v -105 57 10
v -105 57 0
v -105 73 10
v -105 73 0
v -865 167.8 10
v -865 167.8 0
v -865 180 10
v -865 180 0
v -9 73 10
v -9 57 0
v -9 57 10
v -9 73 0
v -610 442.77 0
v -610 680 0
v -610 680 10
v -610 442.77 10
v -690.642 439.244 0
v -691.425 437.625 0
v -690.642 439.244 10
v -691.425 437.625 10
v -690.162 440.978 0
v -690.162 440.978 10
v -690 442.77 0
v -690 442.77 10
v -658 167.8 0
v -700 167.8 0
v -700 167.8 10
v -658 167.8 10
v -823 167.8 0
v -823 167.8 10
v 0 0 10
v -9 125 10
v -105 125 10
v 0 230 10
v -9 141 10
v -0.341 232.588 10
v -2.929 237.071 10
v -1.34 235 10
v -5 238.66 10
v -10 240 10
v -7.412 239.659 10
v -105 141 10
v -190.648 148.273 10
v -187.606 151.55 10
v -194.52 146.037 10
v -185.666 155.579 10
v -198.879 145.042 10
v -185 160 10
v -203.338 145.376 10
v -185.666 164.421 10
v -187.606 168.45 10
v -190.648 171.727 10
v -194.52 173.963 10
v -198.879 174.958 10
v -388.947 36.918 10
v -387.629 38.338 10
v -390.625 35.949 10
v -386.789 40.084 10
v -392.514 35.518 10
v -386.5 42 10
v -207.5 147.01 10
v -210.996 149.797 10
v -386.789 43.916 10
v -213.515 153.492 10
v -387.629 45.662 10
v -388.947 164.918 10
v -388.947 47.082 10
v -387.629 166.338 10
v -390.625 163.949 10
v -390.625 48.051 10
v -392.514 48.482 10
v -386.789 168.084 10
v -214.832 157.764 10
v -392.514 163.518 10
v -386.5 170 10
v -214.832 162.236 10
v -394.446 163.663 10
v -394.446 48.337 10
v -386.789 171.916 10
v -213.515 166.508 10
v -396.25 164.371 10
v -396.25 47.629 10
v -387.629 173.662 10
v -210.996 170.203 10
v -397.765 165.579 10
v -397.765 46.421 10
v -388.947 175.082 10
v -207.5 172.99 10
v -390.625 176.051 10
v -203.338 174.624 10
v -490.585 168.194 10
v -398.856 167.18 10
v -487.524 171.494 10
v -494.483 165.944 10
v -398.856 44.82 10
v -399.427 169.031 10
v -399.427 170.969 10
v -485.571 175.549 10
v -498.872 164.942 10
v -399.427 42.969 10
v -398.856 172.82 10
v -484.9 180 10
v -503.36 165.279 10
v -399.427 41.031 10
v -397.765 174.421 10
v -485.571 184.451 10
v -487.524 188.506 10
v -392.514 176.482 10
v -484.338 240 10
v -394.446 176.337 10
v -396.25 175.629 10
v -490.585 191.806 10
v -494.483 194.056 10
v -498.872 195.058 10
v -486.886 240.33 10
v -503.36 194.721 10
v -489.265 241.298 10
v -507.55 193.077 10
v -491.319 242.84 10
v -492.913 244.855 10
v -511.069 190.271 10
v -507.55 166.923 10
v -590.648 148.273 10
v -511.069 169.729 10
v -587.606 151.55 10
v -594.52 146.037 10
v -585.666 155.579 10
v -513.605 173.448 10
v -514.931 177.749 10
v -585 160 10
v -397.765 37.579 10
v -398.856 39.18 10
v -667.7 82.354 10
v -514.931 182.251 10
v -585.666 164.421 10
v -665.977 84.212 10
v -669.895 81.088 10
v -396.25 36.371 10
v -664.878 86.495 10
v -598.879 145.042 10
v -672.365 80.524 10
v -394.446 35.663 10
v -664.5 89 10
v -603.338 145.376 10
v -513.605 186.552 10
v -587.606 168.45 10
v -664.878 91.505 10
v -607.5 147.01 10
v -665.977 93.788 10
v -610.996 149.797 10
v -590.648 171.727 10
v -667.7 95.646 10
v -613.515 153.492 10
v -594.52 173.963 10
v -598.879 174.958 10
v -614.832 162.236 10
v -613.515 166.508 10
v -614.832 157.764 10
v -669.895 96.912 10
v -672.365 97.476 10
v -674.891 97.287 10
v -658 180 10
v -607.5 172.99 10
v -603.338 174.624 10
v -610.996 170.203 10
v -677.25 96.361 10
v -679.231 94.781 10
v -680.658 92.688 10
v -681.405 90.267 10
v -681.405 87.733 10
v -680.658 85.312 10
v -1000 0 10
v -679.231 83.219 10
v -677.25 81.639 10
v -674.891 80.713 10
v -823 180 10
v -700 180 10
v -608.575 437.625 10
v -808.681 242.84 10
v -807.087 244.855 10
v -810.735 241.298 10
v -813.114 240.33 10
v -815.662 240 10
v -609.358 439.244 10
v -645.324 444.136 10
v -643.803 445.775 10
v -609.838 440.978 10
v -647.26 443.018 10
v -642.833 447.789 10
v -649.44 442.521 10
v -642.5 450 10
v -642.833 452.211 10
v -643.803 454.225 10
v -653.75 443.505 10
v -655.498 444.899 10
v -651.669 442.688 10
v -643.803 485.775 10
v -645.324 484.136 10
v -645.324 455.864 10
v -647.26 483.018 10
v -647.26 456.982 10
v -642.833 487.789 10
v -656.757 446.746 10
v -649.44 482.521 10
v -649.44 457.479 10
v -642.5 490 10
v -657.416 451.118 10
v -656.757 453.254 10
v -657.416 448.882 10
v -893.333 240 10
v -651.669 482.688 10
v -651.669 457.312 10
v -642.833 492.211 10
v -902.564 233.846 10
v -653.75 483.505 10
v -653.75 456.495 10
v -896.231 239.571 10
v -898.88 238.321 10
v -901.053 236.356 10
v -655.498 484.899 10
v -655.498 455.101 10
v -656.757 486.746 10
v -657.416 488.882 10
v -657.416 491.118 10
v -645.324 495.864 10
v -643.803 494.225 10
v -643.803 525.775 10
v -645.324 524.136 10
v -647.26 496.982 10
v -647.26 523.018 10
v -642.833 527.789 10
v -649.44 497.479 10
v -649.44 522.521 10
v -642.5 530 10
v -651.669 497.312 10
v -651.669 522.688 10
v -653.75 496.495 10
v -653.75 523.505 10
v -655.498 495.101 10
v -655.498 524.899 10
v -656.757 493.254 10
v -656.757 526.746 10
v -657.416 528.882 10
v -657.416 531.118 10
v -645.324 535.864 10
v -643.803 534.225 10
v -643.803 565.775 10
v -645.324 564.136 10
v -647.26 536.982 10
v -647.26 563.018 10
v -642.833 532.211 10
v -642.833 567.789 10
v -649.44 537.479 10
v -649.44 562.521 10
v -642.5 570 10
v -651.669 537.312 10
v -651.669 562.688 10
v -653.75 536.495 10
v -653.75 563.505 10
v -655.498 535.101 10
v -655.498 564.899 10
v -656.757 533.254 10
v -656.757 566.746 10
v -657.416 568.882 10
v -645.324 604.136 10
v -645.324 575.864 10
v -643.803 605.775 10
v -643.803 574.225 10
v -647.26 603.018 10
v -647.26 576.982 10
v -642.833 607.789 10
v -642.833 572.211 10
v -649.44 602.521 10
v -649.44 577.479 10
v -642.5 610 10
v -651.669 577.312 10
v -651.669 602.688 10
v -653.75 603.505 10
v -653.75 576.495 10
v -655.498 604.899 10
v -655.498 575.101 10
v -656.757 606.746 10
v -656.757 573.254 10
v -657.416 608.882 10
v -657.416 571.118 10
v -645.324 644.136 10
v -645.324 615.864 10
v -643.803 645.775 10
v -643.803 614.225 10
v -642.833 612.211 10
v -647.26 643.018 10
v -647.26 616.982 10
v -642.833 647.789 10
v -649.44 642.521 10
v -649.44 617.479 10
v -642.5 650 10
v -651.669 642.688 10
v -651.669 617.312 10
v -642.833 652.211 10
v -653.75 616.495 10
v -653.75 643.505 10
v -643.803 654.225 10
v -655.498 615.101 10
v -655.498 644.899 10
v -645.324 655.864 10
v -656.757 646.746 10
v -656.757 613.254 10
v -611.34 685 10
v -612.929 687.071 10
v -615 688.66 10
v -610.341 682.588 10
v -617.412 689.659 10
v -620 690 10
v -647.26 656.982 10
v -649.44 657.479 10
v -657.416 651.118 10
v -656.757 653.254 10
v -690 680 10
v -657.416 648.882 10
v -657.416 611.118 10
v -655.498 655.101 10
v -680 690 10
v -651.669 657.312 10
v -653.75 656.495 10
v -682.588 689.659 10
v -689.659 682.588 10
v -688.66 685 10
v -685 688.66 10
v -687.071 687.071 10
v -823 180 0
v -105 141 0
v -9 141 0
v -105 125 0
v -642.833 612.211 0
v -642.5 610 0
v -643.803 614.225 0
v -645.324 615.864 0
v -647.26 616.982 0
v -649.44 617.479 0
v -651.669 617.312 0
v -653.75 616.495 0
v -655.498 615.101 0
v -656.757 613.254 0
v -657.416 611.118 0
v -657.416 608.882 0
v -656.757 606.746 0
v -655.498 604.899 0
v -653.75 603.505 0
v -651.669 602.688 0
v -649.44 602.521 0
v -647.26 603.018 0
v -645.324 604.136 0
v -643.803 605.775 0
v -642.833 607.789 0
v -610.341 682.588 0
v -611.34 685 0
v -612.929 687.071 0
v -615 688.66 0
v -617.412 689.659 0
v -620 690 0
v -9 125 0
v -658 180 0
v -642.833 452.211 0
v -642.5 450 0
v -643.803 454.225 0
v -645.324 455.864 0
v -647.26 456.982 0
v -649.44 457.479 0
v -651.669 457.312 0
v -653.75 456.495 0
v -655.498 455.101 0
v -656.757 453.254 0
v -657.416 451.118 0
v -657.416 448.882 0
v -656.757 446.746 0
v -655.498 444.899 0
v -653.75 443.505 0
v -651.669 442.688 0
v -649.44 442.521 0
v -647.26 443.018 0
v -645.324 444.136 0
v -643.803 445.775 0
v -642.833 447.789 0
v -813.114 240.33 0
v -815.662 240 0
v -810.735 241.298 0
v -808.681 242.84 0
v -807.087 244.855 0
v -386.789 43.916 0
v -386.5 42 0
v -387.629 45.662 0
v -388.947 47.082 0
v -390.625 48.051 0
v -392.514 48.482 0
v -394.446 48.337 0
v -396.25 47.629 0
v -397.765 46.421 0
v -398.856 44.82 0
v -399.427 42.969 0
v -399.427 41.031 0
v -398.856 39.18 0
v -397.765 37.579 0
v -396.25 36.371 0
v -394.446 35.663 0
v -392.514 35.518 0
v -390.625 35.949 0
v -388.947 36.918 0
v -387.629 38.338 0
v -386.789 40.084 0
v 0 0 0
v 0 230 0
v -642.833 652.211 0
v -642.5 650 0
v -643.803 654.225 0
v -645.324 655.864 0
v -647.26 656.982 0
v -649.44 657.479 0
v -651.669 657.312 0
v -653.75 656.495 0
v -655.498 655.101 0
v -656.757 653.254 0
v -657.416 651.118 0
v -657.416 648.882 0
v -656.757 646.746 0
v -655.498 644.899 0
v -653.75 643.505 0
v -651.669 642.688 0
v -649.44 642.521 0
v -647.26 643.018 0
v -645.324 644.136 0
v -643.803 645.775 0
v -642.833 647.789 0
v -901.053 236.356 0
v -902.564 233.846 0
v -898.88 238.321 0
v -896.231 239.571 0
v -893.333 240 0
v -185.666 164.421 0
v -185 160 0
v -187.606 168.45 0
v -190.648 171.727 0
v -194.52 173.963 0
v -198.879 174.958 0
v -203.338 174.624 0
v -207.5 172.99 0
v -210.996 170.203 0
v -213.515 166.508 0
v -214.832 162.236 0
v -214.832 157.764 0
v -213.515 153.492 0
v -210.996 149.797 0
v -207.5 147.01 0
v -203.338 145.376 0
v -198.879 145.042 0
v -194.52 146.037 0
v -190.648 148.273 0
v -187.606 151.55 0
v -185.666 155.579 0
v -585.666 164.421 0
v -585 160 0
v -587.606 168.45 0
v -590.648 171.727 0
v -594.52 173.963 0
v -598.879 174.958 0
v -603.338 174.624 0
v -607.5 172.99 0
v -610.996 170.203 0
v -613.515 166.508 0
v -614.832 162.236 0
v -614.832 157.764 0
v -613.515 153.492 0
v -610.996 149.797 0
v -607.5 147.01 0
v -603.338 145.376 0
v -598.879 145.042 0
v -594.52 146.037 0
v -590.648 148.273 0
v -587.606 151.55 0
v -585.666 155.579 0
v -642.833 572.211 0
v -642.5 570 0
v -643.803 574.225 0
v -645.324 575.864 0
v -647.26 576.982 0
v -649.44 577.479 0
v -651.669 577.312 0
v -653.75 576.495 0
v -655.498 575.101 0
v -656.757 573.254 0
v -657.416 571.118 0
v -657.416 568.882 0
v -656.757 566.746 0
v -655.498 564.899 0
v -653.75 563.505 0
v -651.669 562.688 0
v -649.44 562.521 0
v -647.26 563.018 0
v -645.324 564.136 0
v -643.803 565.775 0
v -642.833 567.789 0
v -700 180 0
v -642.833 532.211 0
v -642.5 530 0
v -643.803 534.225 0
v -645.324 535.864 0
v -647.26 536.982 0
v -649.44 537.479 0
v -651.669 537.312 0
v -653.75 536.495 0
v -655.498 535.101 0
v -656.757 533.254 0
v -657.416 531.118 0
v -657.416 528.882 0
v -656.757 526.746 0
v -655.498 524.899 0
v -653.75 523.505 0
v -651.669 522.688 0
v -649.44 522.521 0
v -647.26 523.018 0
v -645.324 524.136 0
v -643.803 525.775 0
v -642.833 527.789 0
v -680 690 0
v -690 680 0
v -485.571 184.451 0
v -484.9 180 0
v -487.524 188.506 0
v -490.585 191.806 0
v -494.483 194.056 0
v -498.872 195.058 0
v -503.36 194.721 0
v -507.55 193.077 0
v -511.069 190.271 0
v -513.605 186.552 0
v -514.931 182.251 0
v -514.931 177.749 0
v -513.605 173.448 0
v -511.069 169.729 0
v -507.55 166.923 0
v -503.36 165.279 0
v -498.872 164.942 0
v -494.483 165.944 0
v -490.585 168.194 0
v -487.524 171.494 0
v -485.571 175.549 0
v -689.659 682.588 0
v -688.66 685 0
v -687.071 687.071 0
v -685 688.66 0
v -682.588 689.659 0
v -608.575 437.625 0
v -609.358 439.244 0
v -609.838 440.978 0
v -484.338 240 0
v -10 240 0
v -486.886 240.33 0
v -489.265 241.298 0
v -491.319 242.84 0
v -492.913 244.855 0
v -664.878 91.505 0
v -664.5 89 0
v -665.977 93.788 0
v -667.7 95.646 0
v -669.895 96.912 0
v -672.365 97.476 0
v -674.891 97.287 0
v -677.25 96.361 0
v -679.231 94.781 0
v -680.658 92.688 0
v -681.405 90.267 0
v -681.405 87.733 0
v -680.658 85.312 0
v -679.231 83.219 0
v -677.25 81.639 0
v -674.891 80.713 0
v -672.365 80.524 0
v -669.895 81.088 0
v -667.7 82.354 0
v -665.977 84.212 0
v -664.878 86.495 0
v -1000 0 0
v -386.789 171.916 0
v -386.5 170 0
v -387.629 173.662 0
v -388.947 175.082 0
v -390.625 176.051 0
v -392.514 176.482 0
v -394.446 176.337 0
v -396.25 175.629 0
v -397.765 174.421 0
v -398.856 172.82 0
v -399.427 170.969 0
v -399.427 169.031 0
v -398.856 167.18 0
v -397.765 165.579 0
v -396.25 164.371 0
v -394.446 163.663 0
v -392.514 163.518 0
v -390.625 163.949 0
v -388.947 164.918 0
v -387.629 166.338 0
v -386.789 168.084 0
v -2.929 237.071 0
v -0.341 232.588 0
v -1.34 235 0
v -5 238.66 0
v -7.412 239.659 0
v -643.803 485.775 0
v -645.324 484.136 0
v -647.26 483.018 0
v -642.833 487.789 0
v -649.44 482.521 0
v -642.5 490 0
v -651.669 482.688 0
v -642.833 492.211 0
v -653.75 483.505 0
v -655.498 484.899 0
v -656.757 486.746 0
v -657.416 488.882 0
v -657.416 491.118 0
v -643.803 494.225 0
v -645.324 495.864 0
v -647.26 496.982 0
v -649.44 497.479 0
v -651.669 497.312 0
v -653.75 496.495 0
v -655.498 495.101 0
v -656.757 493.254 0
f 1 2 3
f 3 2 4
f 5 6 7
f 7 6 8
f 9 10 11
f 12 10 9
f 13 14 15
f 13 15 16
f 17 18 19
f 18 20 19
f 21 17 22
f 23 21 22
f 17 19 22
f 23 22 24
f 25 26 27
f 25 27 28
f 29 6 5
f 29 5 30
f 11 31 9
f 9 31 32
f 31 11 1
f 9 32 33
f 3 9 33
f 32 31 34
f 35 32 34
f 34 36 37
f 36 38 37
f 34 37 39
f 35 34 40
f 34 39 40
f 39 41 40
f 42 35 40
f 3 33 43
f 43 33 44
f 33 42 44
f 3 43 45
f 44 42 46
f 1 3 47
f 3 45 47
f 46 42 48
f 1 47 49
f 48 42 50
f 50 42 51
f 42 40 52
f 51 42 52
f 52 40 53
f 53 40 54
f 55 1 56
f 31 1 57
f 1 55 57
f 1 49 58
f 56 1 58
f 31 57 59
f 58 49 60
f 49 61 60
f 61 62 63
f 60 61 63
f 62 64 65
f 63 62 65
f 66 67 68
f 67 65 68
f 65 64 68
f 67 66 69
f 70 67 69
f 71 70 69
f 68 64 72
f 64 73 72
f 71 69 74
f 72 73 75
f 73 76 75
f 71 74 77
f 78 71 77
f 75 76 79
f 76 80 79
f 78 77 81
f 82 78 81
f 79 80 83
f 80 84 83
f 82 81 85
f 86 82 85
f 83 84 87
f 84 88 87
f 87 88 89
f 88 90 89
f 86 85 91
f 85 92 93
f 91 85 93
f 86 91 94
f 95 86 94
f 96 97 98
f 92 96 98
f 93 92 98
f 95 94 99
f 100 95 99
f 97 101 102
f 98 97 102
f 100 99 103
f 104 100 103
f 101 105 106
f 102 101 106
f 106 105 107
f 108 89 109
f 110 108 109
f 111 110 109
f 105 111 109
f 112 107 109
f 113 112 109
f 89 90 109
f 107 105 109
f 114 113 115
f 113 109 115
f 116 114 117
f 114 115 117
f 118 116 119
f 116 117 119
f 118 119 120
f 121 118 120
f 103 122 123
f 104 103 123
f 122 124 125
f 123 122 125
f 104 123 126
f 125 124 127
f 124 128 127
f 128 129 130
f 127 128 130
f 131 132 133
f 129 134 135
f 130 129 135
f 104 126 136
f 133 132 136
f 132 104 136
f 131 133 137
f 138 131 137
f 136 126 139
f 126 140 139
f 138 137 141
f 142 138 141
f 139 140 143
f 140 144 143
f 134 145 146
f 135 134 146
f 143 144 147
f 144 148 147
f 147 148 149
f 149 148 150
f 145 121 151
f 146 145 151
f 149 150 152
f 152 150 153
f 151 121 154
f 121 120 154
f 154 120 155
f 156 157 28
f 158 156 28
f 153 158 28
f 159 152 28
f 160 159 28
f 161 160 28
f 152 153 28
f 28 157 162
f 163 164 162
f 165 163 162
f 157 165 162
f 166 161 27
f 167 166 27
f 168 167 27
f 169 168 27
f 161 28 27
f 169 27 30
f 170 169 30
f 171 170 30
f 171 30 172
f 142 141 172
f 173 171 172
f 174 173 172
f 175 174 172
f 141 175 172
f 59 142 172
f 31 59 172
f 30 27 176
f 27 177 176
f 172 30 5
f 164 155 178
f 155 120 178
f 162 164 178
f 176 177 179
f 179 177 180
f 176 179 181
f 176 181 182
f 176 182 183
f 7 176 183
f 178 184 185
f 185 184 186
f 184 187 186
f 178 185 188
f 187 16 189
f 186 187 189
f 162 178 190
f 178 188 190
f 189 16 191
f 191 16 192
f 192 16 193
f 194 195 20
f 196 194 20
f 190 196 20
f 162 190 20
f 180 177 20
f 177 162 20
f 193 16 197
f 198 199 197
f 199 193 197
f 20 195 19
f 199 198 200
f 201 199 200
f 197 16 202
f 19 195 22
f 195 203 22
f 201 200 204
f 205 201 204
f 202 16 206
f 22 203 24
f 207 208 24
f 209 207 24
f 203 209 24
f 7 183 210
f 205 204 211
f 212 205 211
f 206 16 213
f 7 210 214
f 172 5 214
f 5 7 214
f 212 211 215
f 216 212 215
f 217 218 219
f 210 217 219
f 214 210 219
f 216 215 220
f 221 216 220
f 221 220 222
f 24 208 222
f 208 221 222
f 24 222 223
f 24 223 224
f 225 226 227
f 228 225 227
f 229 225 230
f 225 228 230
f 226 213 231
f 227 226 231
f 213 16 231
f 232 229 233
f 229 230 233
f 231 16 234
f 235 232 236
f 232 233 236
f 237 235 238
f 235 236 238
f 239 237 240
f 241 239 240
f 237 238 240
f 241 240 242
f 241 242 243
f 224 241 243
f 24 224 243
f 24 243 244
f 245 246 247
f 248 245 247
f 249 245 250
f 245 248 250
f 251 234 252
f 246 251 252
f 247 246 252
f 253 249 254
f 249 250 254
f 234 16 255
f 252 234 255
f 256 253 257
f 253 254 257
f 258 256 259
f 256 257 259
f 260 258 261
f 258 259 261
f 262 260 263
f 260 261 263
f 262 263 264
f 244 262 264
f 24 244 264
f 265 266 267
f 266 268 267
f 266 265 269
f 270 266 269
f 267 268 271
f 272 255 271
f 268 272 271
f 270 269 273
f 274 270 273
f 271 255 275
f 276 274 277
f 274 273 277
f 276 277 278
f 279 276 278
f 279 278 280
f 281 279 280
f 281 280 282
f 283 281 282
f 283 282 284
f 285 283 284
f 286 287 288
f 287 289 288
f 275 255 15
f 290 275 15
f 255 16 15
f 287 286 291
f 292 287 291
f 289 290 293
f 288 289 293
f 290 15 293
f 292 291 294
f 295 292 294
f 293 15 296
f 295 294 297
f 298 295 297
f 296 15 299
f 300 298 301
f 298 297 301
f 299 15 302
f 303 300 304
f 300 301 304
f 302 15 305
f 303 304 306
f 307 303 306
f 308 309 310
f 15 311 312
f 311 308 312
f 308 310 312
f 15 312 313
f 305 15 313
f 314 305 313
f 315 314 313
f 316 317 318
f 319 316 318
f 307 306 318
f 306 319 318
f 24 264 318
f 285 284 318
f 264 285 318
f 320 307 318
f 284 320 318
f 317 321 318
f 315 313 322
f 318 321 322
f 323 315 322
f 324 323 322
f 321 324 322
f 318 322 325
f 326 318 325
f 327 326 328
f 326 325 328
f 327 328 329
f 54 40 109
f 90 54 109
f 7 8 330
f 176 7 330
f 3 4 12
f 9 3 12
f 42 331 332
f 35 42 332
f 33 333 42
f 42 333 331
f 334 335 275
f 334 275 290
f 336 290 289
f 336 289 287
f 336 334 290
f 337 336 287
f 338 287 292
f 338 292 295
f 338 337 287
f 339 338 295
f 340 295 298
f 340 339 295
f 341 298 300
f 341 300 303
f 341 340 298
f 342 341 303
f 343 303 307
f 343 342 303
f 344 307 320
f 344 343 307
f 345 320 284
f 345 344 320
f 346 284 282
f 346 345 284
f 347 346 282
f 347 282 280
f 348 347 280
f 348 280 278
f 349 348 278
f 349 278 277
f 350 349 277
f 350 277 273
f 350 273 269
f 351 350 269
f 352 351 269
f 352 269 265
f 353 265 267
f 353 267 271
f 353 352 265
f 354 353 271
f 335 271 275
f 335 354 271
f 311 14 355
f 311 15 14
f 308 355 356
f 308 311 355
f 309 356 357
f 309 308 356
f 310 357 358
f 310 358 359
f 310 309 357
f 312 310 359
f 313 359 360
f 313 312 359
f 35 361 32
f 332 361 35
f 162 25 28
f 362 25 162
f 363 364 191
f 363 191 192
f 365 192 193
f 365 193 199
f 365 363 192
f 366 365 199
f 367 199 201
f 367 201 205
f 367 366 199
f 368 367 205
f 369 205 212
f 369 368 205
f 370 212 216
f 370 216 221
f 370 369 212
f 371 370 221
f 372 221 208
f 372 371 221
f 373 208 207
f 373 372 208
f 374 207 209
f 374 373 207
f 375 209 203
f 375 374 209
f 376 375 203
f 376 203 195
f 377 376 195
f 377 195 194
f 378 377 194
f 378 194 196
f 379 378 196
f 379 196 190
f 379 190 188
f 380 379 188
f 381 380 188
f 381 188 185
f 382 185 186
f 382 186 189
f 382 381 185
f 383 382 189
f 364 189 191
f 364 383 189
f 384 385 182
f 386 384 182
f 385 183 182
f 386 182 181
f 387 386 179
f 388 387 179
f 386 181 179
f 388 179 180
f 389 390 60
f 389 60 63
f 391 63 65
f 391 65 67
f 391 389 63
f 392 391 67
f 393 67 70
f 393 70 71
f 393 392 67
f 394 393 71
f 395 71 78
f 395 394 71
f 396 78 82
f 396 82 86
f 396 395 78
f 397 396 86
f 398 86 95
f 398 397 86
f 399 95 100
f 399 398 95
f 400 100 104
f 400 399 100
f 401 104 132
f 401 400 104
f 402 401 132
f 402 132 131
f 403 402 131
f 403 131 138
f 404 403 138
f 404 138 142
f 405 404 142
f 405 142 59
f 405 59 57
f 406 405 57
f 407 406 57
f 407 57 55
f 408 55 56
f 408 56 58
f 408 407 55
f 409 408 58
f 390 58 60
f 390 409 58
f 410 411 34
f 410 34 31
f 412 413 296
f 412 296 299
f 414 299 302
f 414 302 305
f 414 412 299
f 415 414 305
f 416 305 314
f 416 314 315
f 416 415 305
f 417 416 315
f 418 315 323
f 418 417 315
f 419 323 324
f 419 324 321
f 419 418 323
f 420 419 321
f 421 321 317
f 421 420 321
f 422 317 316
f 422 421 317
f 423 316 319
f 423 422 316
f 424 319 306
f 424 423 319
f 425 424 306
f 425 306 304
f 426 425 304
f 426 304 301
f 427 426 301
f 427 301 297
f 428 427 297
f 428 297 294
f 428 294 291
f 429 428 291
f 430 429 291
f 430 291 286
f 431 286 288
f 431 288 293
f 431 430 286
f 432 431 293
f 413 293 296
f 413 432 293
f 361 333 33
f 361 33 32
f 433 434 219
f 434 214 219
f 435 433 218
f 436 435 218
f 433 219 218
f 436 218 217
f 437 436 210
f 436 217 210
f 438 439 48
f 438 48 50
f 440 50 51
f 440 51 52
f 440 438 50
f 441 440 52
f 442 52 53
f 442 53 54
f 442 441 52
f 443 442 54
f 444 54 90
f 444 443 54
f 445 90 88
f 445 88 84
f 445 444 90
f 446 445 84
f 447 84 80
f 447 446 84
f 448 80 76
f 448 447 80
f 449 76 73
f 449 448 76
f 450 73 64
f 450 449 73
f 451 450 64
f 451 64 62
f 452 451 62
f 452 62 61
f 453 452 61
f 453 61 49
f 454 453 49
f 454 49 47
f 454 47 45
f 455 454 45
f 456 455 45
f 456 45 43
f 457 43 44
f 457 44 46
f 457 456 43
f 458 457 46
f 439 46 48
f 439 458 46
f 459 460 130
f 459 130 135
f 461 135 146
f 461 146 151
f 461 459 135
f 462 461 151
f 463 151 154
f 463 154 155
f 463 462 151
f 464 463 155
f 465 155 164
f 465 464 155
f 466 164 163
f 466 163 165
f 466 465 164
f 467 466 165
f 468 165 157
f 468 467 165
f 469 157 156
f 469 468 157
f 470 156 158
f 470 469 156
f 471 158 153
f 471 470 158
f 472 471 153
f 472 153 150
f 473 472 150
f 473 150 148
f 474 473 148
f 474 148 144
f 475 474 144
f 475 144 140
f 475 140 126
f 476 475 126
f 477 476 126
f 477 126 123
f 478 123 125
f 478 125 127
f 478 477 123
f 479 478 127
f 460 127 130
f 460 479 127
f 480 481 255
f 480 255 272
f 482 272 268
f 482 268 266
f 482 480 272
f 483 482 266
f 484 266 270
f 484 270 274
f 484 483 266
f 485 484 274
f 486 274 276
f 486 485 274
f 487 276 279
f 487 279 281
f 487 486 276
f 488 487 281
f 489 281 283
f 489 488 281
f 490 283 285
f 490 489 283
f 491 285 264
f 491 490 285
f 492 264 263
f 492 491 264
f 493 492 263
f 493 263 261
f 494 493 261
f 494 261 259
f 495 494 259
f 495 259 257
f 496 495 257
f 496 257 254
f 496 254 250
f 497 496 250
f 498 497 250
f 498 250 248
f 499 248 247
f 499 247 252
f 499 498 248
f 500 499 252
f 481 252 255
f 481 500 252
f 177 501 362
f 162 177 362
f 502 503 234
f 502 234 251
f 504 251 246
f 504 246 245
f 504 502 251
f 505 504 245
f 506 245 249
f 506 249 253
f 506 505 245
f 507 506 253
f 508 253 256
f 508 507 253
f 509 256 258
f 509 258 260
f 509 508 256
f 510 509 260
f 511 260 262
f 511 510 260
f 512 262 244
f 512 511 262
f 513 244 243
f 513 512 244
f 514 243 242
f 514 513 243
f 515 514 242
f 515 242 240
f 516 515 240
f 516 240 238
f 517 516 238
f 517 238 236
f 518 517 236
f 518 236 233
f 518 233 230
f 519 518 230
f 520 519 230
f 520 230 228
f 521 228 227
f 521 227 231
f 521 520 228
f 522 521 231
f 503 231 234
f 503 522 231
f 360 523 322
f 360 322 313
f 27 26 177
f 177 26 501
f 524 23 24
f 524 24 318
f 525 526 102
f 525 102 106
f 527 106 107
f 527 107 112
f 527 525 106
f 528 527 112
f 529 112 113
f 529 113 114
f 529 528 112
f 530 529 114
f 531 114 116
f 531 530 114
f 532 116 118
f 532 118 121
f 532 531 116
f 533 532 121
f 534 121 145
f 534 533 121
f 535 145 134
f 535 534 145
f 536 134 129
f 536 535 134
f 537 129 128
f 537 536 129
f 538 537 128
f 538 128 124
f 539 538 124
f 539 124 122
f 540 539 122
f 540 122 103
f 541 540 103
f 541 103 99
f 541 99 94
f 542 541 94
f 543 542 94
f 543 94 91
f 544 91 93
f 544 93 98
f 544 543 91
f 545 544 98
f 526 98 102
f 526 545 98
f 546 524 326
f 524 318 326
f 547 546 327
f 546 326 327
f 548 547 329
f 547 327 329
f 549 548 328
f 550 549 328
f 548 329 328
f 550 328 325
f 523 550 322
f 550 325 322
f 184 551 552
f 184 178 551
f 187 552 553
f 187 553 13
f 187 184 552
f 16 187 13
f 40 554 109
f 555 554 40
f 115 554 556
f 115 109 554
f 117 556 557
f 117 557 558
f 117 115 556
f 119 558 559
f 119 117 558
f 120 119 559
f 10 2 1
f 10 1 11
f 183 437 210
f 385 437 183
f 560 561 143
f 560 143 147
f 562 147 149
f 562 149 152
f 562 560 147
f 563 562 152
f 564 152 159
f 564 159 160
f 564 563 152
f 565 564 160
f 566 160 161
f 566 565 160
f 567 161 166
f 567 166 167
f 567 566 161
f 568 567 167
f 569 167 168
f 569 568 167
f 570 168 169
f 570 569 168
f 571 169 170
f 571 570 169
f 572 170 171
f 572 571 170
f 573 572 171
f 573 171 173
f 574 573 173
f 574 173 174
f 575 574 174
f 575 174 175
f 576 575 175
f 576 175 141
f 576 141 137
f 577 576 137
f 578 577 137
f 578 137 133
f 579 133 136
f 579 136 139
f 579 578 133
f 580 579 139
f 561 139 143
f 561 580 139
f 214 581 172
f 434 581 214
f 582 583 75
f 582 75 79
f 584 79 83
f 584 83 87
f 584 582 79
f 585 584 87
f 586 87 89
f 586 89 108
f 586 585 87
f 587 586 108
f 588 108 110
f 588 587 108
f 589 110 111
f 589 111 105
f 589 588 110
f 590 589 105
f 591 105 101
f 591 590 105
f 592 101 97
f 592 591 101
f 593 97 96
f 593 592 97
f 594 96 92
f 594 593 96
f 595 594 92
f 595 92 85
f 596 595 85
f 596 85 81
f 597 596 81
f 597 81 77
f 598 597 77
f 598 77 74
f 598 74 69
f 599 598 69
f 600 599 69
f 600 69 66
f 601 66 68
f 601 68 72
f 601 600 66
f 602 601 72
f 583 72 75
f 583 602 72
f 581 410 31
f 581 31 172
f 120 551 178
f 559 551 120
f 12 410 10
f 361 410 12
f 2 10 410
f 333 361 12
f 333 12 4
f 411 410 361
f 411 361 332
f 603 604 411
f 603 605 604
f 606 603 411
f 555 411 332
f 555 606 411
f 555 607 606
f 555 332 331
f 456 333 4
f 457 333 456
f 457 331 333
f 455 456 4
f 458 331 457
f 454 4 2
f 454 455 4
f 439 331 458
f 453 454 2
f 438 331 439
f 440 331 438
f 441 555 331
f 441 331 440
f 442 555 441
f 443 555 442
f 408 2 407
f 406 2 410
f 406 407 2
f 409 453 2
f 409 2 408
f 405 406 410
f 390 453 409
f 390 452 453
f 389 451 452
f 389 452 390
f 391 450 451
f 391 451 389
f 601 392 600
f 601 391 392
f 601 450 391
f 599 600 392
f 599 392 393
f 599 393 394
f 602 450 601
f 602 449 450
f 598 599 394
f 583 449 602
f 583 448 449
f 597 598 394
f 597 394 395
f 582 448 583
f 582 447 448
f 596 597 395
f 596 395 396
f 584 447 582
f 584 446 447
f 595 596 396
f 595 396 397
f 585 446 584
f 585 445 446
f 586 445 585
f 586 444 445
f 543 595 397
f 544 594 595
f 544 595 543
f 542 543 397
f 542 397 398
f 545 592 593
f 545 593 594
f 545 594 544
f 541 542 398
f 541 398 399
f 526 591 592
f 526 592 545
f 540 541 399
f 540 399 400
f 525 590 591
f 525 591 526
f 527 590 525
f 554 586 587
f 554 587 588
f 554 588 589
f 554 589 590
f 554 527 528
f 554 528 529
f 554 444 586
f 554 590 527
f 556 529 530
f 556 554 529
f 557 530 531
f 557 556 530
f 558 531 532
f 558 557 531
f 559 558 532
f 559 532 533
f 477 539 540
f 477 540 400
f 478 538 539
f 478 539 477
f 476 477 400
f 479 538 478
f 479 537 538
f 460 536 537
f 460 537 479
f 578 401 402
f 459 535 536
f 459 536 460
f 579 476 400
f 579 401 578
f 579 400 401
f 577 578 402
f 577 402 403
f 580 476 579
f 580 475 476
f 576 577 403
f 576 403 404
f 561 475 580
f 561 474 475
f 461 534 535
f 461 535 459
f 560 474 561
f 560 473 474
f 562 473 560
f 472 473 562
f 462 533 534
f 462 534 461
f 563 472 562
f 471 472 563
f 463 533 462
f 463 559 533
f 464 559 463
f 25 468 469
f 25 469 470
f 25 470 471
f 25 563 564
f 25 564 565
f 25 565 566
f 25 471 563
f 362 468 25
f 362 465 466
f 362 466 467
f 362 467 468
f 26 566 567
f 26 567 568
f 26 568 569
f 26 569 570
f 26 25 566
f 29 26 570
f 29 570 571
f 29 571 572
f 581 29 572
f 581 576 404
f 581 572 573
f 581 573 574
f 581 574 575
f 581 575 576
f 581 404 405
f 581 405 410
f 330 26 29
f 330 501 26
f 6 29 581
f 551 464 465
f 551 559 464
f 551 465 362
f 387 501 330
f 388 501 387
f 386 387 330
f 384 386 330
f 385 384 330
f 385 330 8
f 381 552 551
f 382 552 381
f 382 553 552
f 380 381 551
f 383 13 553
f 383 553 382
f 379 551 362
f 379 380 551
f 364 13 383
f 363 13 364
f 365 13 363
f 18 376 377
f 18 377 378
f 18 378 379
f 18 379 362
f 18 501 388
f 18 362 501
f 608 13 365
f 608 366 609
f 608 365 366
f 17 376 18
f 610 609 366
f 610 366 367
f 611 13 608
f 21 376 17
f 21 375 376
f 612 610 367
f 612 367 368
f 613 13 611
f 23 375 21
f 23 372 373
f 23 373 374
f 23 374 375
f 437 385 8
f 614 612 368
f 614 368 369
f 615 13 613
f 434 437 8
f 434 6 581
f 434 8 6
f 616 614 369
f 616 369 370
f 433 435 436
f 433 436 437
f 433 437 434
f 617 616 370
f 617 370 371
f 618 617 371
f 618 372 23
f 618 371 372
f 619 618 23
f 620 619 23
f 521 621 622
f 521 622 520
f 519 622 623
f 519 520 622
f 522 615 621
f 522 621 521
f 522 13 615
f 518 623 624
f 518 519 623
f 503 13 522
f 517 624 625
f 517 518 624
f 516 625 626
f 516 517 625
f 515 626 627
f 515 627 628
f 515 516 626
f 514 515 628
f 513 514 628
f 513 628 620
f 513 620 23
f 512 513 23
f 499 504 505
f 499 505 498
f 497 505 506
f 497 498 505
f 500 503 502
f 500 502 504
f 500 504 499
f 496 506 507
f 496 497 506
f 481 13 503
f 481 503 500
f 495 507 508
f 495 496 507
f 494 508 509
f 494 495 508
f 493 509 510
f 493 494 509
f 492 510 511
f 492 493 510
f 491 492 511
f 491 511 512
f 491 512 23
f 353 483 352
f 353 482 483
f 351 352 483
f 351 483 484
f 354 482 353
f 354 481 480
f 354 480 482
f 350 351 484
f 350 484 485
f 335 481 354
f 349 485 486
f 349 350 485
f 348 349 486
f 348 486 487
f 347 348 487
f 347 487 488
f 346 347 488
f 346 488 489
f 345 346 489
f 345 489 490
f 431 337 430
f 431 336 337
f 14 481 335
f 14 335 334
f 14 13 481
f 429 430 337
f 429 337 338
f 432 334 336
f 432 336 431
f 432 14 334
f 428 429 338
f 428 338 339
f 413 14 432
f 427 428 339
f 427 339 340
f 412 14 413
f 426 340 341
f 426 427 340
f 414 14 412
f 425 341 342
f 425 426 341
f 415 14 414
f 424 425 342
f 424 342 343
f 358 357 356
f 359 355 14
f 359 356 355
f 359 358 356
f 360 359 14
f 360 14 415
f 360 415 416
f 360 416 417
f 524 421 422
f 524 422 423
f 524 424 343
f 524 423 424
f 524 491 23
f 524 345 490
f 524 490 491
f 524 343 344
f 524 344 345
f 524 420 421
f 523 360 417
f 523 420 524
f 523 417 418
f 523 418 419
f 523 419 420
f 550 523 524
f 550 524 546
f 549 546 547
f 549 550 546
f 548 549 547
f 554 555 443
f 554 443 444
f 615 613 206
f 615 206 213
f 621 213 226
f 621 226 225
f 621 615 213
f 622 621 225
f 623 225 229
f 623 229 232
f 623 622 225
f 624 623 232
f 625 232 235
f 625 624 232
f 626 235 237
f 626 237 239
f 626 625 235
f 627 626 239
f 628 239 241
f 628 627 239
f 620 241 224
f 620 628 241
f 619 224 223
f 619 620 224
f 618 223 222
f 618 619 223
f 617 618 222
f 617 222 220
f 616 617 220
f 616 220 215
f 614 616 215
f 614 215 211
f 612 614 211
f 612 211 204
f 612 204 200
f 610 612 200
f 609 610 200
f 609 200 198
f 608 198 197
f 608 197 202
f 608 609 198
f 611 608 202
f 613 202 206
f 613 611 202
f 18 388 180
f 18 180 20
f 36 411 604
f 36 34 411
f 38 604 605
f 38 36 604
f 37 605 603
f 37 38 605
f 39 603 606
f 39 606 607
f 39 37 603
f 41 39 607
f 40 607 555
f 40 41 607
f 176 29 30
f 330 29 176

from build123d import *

# Parameters (mm, degrees)
ESQUISSE1_R        = 15
ESQUISSE1_R_2      = 6.5
ESQUISSE1_R_3      = 8.5
ESQUISSE1_R_4      = 15.1
ESQUISSE1_R_5      = 7.5
ESQUISSE1_W        = 96
ESQUISSE1_H        = 16
ESQUISSE1_W_2      = 42
ESQUISSE1_H_2      = 12.2
BOSS_EXTRU_1_DEPTH = 10
CONG_1_R           = 10


with BuildPart() as part:
    # Esquisse1 → Boss.-Extru.1 (new body)
    with BuildSketch(Plane.XY):
        Polygon((0, 0), (-1000, 0), (-900, 240), (-810, 240), (-690, 440), (-690, 690), (-610, 690), (-610, 440), (-490, 240), (0, 240), align=None)
        with Locations((-200, 160)):
            Circle(ESQUISSE1_R, mode=Mode.SUBTRACT)
        with Locations((-600, 160)):
            Circle(ESQUISSE1_R, mode=Mode.SUBTRACT)
        with Locations((-393, 170)):
            Circle(ESQUISSE1_R_2, mode=Mode.SUBTRACT)
        with Locations((-393, 42)):
            Circle(ESQUISSE1_R_2, mode=Mode.SUBTRACT)
        with Locations((-673, 89)):
            Circle(ESQUISSE1_R_3, mode=Mode.SUBTRACT)
        with Locations((-500, 180)):
            Circle(ESQUISSE1_R_4, mode=Mode.SUBTRACT)
        with Locations((-650, 650)):
            Circle(ESQUISSE1_R_5, mode=Mode.SUBTRACT)
        with Locations((-650, 610)):
            Circle(ESQUISSE1_R_5, mode=Mode.SUBTRACT)
        with Locations((-650, 570)):
            Circle(ESQUISSE1_R_5, mode=Mode.SUBTRACT)
        with Locations((-650, 530)):
            Circle(ESQUISSE1_R_5, mode=Mode.SUBTRACT)
        with Locations((-650, 490)):
            Circle(ESQUISSE1_R_5, mode=Mode.SUBTRACT)
        with Locations((-650, 450)):
            Circle(ESQUISSE1_R_5, mode=Mode.SUBTRACT)
        with Locations((-57, 133)):
            Rectangle(ESQUISSE1_W, ESQUISSE1_H, mode=Mode.SUBTRACT)
        with Locations((-57, 65)):
            Rectangle(ESQUISSE1_W, ESQUISSE1_H, mode=Mode.SUBTRACT)
        with Locations((-844, 173.9)):
            Rectangle(ESQUISSE1_W_2, ESQUISSE1_H_2, mode=Mode.SUBTRACT)
        with Locations((-679, 173.9)):
            Rectangle(ESQUISSE1_W_2, ESQUISSE1_H_2, mode=Mode.SUBTRACT)
    extrude(amount=BOSS_EXTRU_1_DEPTH)

    # Congé1
    cong_1_edges = [part.edges().sort_by_distance(p)[0] for p in [
        (-900, 240, 5),
        (-810, 240, 5),
        (-690, 440, 5),
        (-690, 690, 5),
        (-610, 690, 5),
        (-610, 440, 5),
        (-490, 240, 5),
        (0, 240, 5),
    ]]
    fillet(cong_1_edges, radius=CONG_1_R)


solid = part.part
